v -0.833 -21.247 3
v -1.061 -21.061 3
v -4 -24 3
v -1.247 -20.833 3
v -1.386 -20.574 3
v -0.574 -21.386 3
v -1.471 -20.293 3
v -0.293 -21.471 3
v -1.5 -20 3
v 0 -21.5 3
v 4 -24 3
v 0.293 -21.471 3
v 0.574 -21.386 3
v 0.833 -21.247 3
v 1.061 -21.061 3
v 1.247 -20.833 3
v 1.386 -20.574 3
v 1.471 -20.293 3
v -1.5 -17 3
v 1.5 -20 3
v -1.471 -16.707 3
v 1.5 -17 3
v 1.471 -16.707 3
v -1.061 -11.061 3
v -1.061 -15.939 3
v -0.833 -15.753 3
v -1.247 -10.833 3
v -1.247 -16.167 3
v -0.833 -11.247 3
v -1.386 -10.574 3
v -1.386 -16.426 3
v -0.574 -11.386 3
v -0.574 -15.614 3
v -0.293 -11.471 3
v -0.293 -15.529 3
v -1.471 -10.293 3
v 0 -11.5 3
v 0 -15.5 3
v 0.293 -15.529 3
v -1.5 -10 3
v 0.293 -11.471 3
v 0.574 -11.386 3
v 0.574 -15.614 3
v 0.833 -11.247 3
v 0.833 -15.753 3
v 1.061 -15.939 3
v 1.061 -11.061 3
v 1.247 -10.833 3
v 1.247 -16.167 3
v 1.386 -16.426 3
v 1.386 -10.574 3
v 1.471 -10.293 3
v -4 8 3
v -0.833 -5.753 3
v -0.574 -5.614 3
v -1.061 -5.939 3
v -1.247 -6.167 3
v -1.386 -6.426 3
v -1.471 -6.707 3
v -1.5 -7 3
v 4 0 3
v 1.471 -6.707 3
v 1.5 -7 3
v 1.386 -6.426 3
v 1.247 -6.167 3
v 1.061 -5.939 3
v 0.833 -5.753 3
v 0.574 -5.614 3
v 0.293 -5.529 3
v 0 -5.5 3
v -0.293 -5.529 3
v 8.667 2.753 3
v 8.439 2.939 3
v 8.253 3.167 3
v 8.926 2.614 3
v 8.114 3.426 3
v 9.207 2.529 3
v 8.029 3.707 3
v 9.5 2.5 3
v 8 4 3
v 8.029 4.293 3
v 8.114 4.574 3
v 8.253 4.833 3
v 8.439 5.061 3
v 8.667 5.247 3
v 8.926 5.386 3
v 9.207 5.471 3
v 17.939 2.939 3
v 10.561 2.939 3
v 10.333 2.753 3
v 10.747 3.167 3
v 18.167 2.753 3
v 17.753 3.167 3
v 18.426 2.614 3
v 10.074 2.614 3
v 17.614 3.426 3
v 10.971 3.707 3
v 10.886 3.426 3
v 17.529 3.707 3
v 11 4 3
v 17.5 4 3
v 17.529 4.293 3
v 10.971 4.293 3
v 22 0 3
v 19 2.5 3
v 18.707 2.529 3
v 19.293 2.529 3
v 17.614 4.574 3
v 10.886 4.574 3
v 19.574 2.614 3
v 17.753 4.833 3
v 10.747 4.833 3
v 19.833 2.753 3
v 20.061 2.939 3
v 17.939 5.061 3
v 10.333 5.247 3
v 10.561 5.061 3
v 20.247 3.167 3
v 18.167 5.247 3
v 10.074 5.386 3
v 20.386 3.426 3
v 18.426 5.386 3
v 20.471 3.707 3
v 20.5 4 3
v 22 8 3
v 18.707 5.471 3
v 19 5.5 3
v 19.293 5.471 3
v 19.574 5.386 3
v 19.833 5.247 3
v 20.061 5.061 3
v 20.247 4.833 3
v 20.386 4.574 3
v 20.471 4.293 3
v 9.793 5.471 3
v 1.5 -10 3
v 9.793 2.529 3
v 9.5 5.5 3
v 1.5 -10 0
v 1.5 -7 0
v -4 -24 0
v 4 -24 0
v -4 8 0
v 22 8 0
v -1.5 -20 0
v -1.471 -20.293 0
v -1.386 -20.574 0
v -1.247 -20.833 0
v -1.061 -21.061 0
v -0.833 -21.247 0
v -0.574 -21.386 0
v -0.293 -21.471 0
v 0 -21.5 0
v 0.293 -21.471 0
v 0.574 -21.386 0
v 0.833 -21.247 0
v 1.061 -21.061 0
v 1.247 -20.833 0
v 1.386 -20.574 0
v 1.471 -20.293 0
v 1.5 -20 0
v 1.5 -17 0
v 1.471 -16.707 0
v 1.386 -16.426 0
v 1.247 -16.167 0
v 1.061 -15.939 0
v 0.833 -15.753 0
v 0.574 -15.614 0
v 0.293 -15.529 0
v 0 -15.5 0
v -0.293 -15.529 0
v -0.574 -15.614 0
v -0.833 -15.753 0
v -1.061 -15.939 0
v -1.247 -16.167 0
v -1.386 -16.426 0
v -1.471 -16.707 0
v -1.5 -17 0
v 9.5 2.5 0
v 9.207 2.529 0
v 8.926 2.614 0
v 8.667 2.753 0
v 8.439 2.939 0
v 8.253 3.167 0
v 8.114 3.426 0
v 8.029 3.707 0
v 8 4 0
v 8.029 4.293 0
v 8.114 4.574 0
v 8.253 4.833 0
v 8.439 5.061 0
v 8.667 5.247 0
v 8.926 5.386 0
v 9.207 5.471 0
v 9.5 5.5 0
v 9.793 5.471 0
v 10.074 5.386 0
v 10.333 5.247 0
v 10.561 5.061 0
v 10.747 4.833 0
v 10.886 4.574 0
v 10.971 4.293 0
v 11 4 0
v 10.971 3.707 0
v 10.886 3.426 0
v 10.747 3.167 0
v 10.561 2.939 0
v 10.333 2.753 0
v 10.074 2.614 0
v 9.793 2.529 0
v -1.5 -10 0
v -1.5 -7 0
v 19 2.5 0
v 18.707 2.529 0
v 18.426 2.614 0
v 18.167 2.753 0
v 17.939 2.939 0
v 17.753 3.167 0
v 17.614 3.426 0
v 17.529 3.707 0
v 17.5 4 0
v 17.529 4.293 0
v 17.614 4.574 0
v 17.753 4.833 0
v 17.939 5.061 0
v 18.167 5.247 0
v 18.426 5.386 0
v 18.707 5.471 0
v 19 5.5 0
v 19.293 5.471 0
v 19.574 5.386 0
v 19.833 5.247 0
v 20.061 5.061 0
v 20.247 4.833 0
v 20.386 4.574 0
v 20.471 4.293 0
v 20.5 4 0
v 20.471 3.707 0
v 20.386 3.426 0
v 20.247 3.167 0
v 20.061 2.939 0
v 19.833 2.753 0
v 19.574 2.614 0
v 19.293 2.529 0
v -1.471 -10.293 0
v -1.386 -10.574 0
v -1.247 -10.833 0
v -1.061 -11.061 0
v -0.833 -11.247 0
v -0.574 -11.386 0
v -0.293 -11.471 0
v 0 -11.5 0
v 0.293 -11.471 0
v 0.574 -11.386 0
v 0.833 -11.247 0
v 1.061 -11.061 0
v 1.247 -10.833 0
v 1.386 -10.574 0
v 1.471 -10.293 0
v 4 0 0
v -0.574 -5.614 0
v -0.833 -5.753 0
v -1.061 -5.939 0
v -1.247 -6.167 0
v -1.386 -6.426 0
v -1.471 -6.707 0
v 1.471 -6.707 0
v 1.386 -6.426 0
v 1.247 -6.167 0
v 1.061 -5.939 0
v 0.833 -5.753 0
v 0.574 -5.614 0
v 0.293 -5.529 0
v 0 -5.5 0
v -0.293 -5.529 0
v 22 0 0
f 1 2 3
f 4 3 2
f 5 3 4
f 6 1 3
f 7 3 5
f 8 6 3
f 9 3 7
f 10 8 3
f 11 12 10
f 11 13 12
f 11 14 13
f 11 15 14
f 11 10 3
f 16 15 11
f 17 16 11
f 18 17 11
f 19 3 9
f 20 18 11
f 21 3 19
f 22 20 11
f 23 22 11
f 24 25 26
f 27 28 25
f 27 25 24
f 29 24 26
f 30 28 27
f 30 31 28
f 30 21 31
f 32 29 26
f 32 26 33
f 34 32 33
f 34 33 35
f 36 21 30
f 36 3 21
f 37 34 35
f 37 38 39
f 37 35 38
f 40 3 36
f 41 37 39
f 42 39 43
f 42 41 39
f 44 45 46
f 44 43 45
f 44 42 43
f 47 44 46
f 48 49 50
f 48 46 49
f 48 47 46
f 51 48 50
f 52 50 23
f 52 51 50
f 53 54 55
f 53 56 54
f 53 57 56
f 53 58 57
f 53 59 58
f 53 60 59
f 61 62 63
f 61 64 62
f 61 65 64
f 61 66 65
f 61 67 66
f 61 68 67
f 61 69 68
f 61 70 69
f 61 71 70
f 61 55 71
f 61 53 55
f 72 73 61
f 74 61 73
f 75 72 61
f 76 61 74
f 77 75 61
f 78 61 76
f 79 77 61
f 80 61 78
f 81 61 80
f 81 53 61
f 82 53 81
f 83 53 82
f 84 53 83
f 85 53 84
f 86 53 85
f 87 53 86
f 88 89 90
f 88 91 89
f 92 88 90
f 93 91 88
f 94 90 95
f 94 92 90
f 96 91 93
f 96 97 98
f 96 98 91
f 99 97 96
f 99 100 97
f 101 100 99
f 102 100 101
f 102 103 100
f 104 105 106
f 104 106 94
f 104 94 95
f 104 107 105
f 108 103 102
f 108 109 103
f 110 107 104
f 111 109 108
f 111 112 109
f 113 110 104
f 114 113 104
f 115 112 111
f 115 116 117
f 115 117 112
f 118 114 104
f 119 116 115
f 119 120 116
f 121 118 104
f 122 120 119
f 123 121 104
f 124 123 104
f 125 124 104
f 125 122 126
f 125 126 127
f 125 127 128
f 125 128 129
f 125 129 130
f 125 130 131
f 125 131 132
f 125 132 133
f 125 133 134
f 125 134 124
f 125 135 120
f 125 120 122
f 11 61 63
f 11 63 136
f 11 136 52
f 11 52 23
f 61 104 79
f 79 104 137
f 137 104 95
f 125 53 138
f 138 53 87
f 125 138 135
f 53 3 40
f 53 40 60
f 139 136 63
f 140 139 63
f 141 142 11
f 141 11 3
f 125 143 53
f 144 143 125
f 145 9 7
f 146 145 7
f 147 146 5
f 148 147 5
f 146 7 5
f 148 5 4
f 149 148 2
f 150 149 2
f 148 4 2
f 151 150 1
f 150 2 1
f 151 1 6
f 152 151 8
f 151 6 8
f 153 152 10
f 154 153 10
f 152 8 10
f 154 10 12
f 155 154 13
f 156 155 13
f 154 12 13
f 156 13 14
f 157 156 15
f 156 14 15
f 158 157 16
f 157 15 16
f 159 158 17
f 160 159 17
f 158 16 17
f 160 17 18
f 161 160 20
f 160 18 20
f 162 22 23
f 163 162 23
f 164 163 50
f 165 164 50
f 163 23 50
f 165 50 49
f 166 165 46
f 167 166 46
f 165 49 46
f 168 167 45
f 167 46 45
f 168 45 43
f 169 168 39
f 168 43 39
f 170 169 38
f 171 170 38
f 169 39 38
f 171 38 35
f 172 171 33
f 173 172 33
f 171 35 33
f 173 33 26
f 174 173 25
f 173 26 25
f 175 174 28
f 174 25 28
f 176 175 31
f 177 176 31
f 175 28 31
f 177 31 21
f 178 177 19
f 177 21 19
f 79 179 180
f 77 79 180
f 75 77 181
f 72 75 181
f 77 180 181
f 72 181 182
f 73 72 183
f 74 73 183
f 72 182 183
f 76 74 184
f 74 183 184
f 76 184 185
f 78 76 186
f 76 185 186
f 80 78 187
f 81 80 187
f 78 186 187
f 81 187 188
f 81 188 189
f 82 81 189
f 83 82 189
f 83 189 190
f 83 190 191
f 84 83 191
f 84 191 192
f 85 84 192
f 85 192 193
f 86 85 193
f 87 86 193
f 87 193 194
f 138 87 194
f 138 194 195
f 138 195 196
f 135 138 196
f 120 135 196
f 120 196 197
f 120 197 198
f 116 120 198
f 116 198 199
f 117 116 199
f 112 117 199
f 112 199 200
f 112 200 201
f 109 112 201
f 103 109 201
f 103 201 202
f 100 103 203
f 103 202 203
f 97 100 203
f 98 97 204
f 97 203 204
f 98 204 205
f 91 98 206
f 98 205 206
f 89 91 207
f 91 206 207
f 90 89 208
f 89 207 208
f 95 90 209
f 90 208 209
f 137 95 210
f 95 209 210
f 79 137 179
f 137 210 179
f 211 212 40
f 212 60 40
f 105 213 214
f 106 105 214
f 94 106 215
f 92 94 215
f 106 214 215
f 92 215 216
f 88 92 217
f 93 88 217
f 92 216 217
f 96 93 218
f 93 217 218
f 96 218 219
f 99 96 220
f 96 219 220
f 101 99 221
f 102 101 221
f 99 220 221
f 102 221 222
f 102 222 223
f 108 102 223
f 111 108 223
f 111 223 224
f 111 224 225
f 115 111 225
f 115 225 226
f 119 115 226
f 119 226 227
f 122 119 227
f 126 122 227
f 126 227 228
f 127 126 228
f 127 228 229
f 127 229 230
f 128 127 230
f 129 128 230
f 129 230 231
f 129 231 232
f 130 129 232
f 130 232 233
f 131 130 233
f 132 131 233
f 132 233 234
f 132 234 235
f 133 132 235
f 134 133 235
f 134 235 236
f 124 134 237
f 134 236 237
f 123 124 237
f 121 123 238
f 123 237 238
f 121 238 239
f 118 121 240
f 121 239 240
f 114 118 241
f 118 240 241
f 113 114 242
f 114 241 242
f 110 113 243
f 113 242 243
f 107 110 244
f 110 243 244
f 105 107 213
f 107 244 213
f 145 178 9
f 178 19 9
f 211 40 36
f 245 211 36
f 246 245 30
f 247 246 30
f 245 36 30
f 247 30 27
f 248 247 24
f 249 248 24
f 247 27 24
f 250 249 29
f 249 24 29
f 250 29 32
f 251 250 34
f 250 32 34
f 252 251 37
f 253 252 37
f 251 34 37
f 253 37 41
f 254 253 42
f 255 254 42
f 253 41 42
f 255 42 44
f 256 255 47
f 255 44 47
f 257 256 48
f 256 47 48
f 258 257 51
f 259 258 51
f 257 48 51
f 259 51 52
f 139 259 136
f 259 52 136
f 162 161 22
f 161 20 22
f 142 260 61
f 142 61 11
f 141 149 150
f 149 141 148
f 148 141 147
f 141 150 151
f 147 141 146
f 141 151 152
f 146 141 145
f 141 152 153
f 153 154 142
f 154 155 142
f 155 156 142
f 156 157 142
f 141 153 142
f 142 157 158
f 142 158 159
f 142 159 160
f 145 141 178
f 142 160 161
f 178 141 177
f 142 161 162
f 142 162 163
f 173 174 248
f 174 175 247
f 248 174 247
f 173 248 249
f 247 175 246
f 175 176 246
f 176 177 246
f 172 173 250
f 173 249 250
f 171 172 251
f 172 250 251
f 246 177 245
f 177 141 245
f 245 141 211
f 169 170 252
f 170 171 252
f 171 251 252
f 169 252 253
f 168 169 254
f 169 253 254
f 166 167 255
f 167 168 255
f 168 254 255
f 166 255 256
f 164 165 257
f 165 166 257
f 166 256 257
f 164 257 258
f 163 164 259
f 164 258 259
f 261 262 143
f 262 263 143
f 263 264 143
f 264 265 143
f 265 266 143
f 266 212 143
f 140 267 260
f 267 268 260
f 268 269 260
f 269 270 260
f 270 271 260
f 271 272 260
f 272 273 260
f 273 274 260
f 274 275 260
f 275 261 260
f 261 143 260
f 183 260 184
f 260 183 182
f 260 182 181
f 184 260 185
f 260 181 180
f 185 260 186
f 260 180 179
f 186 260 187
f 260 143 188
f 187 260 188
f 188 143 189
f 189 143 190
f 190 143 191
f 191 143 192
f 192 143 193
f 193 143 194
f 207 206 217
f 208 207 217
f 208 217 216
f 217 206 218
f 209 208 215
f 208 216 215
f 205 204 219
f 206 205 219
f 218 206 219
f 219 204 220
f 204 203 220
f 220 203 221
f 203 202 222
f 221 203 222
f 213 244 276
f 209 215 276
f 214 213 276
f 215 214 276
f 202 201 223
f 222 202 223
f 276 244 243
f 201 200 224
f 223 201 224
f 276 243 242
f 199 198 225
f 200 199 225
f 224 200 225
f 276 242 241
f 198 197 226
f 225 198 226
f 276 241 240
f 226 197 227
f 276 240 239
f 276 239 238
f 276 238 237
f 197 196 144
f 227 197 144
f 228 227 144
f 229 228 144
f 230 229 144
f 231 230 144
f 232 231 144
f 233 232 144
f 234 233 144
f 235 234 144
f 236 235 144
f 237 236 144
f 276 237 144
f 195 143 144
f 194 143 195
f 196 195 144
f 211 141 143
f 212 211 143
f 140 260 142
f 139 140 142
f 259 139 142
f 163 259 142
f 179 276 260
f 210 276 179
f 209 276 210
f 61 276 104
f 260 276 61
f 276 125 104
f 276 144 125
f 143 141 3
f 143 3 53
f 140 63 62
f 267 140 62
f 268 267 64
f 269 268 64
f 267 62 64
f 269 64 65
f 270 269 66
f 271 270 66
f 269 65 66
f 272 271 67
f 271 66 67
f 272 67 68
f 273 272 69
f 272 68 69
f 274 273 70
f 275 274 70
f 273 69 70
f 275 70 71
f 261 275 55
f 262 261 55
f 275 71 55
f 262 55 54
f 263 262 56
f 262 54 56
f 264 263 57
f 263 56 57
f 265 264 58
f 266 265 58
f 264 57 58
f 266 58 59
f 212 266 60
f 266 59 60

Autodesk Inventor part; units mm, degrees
ref_plane "YZ Plane" through (0, 0, 0) normal (1, 0, 0) x (0, 1, 0)
ref_plane "XZ Plane" through (0, 0, 0) normal (0, 1, 0) x (-1, 0, 0)
ref_plane "XY Plane" through (0, 0, 0) normal (0, 0, 1) x (1, 0, 0)
sketch "Sketch1" plane through (0, 0, 0) normal (0, 0, 1) x (1, 0, 0)
  line L0 (-4, -24) -> (-4, 8)
  line L1 (-4, 8) -> (22, 8)
  line L2 (22, 8) -> (22, 0)
  line L3 (22, 0) -> (4, 0)
  line L4 (4, 0) -> (4, -24)
  line L5 (4, -24) -> (-4, -24)
  point P0 (0, 0)
  dimension "d0" = 0
  dimension "d1" = 8
  dimension "d2" = 8
  dimension "d3" = 4
  dimension "d5" = 26
  dimension "d6" = 32
extrude "Extrusion1" add sketch "Sketch1" along normal blind 3
sketch "Sketch2" plane through (0, 0, 3) normal (0, 0, 1) x (1, 0, 0)
  circle A0 centre (0, 4) radius 1.5
  circle A1 centre (19, 4) radius 1.5
  circle A2 centre (0, -6) radius 1.5
  circle A3 centre (9.5, 4) radius 1.5
  line L0 (-4, 8) -> (-4, -24) projected
  point P0 (0, 0)
  dimension "d9" = 3
  dimension "d10" = 3
  dimension "d11" = 3
  dimension "d12" = 10
  dimension "d15" = 4
  dimension "d24" = 9.5
  dimension "d25" = 13.5
hole "Hole1" at (9.5, 4, 3) at (19, 4, 3) direction (0, 0, -1) diameter 3 end through all
sketch "Sketch3" plane through (0, 0, 3) normal (0, 0, 1) x (1, 0, 0)
  line L0 (0, -7) -> (0, -10) construction
  line L1 (-1.5, -7) -> (-1.5, -10)
  line L2 (1.5, -10) -> (1.5, -7)
  arc A0 (1.5, -7) -> (-1.5, -7) centre (0, -7) ccw
  arc A1 (-1.5, -10) -> (1.5, -10) centre (0, -10) ccw
  line L3 (0, -17) -> (0, -20) construction
  line L4 (-1.5, -17) -> (-1.5, -20)
  line L5 (1.5, -20) -> (1.5, -17)
  arc A2 (1.5, -17) -> (-1.5, -17) centre (0, -17) ccw
  arc A3 (-1.5, -20) -> (1.5, -20) centre (0, -20) ccw
  point P0 (0, 0)
  point P1 (0, -8.5)
  point P2 (0, -18.5)
  dimension "d26" = 3
  dimension "d27" = 3
  dimension "d29" = 10
  dimension "d32" = 7
extrude "Extrusion2" cut sketch "Sketch3" against normal through all
equation "\"d3\" = 0.5 * d2"
equation "\"d16\" = d11"
properties part number "Gripper_Endstop_Holder" material "Aluminum 6061"
